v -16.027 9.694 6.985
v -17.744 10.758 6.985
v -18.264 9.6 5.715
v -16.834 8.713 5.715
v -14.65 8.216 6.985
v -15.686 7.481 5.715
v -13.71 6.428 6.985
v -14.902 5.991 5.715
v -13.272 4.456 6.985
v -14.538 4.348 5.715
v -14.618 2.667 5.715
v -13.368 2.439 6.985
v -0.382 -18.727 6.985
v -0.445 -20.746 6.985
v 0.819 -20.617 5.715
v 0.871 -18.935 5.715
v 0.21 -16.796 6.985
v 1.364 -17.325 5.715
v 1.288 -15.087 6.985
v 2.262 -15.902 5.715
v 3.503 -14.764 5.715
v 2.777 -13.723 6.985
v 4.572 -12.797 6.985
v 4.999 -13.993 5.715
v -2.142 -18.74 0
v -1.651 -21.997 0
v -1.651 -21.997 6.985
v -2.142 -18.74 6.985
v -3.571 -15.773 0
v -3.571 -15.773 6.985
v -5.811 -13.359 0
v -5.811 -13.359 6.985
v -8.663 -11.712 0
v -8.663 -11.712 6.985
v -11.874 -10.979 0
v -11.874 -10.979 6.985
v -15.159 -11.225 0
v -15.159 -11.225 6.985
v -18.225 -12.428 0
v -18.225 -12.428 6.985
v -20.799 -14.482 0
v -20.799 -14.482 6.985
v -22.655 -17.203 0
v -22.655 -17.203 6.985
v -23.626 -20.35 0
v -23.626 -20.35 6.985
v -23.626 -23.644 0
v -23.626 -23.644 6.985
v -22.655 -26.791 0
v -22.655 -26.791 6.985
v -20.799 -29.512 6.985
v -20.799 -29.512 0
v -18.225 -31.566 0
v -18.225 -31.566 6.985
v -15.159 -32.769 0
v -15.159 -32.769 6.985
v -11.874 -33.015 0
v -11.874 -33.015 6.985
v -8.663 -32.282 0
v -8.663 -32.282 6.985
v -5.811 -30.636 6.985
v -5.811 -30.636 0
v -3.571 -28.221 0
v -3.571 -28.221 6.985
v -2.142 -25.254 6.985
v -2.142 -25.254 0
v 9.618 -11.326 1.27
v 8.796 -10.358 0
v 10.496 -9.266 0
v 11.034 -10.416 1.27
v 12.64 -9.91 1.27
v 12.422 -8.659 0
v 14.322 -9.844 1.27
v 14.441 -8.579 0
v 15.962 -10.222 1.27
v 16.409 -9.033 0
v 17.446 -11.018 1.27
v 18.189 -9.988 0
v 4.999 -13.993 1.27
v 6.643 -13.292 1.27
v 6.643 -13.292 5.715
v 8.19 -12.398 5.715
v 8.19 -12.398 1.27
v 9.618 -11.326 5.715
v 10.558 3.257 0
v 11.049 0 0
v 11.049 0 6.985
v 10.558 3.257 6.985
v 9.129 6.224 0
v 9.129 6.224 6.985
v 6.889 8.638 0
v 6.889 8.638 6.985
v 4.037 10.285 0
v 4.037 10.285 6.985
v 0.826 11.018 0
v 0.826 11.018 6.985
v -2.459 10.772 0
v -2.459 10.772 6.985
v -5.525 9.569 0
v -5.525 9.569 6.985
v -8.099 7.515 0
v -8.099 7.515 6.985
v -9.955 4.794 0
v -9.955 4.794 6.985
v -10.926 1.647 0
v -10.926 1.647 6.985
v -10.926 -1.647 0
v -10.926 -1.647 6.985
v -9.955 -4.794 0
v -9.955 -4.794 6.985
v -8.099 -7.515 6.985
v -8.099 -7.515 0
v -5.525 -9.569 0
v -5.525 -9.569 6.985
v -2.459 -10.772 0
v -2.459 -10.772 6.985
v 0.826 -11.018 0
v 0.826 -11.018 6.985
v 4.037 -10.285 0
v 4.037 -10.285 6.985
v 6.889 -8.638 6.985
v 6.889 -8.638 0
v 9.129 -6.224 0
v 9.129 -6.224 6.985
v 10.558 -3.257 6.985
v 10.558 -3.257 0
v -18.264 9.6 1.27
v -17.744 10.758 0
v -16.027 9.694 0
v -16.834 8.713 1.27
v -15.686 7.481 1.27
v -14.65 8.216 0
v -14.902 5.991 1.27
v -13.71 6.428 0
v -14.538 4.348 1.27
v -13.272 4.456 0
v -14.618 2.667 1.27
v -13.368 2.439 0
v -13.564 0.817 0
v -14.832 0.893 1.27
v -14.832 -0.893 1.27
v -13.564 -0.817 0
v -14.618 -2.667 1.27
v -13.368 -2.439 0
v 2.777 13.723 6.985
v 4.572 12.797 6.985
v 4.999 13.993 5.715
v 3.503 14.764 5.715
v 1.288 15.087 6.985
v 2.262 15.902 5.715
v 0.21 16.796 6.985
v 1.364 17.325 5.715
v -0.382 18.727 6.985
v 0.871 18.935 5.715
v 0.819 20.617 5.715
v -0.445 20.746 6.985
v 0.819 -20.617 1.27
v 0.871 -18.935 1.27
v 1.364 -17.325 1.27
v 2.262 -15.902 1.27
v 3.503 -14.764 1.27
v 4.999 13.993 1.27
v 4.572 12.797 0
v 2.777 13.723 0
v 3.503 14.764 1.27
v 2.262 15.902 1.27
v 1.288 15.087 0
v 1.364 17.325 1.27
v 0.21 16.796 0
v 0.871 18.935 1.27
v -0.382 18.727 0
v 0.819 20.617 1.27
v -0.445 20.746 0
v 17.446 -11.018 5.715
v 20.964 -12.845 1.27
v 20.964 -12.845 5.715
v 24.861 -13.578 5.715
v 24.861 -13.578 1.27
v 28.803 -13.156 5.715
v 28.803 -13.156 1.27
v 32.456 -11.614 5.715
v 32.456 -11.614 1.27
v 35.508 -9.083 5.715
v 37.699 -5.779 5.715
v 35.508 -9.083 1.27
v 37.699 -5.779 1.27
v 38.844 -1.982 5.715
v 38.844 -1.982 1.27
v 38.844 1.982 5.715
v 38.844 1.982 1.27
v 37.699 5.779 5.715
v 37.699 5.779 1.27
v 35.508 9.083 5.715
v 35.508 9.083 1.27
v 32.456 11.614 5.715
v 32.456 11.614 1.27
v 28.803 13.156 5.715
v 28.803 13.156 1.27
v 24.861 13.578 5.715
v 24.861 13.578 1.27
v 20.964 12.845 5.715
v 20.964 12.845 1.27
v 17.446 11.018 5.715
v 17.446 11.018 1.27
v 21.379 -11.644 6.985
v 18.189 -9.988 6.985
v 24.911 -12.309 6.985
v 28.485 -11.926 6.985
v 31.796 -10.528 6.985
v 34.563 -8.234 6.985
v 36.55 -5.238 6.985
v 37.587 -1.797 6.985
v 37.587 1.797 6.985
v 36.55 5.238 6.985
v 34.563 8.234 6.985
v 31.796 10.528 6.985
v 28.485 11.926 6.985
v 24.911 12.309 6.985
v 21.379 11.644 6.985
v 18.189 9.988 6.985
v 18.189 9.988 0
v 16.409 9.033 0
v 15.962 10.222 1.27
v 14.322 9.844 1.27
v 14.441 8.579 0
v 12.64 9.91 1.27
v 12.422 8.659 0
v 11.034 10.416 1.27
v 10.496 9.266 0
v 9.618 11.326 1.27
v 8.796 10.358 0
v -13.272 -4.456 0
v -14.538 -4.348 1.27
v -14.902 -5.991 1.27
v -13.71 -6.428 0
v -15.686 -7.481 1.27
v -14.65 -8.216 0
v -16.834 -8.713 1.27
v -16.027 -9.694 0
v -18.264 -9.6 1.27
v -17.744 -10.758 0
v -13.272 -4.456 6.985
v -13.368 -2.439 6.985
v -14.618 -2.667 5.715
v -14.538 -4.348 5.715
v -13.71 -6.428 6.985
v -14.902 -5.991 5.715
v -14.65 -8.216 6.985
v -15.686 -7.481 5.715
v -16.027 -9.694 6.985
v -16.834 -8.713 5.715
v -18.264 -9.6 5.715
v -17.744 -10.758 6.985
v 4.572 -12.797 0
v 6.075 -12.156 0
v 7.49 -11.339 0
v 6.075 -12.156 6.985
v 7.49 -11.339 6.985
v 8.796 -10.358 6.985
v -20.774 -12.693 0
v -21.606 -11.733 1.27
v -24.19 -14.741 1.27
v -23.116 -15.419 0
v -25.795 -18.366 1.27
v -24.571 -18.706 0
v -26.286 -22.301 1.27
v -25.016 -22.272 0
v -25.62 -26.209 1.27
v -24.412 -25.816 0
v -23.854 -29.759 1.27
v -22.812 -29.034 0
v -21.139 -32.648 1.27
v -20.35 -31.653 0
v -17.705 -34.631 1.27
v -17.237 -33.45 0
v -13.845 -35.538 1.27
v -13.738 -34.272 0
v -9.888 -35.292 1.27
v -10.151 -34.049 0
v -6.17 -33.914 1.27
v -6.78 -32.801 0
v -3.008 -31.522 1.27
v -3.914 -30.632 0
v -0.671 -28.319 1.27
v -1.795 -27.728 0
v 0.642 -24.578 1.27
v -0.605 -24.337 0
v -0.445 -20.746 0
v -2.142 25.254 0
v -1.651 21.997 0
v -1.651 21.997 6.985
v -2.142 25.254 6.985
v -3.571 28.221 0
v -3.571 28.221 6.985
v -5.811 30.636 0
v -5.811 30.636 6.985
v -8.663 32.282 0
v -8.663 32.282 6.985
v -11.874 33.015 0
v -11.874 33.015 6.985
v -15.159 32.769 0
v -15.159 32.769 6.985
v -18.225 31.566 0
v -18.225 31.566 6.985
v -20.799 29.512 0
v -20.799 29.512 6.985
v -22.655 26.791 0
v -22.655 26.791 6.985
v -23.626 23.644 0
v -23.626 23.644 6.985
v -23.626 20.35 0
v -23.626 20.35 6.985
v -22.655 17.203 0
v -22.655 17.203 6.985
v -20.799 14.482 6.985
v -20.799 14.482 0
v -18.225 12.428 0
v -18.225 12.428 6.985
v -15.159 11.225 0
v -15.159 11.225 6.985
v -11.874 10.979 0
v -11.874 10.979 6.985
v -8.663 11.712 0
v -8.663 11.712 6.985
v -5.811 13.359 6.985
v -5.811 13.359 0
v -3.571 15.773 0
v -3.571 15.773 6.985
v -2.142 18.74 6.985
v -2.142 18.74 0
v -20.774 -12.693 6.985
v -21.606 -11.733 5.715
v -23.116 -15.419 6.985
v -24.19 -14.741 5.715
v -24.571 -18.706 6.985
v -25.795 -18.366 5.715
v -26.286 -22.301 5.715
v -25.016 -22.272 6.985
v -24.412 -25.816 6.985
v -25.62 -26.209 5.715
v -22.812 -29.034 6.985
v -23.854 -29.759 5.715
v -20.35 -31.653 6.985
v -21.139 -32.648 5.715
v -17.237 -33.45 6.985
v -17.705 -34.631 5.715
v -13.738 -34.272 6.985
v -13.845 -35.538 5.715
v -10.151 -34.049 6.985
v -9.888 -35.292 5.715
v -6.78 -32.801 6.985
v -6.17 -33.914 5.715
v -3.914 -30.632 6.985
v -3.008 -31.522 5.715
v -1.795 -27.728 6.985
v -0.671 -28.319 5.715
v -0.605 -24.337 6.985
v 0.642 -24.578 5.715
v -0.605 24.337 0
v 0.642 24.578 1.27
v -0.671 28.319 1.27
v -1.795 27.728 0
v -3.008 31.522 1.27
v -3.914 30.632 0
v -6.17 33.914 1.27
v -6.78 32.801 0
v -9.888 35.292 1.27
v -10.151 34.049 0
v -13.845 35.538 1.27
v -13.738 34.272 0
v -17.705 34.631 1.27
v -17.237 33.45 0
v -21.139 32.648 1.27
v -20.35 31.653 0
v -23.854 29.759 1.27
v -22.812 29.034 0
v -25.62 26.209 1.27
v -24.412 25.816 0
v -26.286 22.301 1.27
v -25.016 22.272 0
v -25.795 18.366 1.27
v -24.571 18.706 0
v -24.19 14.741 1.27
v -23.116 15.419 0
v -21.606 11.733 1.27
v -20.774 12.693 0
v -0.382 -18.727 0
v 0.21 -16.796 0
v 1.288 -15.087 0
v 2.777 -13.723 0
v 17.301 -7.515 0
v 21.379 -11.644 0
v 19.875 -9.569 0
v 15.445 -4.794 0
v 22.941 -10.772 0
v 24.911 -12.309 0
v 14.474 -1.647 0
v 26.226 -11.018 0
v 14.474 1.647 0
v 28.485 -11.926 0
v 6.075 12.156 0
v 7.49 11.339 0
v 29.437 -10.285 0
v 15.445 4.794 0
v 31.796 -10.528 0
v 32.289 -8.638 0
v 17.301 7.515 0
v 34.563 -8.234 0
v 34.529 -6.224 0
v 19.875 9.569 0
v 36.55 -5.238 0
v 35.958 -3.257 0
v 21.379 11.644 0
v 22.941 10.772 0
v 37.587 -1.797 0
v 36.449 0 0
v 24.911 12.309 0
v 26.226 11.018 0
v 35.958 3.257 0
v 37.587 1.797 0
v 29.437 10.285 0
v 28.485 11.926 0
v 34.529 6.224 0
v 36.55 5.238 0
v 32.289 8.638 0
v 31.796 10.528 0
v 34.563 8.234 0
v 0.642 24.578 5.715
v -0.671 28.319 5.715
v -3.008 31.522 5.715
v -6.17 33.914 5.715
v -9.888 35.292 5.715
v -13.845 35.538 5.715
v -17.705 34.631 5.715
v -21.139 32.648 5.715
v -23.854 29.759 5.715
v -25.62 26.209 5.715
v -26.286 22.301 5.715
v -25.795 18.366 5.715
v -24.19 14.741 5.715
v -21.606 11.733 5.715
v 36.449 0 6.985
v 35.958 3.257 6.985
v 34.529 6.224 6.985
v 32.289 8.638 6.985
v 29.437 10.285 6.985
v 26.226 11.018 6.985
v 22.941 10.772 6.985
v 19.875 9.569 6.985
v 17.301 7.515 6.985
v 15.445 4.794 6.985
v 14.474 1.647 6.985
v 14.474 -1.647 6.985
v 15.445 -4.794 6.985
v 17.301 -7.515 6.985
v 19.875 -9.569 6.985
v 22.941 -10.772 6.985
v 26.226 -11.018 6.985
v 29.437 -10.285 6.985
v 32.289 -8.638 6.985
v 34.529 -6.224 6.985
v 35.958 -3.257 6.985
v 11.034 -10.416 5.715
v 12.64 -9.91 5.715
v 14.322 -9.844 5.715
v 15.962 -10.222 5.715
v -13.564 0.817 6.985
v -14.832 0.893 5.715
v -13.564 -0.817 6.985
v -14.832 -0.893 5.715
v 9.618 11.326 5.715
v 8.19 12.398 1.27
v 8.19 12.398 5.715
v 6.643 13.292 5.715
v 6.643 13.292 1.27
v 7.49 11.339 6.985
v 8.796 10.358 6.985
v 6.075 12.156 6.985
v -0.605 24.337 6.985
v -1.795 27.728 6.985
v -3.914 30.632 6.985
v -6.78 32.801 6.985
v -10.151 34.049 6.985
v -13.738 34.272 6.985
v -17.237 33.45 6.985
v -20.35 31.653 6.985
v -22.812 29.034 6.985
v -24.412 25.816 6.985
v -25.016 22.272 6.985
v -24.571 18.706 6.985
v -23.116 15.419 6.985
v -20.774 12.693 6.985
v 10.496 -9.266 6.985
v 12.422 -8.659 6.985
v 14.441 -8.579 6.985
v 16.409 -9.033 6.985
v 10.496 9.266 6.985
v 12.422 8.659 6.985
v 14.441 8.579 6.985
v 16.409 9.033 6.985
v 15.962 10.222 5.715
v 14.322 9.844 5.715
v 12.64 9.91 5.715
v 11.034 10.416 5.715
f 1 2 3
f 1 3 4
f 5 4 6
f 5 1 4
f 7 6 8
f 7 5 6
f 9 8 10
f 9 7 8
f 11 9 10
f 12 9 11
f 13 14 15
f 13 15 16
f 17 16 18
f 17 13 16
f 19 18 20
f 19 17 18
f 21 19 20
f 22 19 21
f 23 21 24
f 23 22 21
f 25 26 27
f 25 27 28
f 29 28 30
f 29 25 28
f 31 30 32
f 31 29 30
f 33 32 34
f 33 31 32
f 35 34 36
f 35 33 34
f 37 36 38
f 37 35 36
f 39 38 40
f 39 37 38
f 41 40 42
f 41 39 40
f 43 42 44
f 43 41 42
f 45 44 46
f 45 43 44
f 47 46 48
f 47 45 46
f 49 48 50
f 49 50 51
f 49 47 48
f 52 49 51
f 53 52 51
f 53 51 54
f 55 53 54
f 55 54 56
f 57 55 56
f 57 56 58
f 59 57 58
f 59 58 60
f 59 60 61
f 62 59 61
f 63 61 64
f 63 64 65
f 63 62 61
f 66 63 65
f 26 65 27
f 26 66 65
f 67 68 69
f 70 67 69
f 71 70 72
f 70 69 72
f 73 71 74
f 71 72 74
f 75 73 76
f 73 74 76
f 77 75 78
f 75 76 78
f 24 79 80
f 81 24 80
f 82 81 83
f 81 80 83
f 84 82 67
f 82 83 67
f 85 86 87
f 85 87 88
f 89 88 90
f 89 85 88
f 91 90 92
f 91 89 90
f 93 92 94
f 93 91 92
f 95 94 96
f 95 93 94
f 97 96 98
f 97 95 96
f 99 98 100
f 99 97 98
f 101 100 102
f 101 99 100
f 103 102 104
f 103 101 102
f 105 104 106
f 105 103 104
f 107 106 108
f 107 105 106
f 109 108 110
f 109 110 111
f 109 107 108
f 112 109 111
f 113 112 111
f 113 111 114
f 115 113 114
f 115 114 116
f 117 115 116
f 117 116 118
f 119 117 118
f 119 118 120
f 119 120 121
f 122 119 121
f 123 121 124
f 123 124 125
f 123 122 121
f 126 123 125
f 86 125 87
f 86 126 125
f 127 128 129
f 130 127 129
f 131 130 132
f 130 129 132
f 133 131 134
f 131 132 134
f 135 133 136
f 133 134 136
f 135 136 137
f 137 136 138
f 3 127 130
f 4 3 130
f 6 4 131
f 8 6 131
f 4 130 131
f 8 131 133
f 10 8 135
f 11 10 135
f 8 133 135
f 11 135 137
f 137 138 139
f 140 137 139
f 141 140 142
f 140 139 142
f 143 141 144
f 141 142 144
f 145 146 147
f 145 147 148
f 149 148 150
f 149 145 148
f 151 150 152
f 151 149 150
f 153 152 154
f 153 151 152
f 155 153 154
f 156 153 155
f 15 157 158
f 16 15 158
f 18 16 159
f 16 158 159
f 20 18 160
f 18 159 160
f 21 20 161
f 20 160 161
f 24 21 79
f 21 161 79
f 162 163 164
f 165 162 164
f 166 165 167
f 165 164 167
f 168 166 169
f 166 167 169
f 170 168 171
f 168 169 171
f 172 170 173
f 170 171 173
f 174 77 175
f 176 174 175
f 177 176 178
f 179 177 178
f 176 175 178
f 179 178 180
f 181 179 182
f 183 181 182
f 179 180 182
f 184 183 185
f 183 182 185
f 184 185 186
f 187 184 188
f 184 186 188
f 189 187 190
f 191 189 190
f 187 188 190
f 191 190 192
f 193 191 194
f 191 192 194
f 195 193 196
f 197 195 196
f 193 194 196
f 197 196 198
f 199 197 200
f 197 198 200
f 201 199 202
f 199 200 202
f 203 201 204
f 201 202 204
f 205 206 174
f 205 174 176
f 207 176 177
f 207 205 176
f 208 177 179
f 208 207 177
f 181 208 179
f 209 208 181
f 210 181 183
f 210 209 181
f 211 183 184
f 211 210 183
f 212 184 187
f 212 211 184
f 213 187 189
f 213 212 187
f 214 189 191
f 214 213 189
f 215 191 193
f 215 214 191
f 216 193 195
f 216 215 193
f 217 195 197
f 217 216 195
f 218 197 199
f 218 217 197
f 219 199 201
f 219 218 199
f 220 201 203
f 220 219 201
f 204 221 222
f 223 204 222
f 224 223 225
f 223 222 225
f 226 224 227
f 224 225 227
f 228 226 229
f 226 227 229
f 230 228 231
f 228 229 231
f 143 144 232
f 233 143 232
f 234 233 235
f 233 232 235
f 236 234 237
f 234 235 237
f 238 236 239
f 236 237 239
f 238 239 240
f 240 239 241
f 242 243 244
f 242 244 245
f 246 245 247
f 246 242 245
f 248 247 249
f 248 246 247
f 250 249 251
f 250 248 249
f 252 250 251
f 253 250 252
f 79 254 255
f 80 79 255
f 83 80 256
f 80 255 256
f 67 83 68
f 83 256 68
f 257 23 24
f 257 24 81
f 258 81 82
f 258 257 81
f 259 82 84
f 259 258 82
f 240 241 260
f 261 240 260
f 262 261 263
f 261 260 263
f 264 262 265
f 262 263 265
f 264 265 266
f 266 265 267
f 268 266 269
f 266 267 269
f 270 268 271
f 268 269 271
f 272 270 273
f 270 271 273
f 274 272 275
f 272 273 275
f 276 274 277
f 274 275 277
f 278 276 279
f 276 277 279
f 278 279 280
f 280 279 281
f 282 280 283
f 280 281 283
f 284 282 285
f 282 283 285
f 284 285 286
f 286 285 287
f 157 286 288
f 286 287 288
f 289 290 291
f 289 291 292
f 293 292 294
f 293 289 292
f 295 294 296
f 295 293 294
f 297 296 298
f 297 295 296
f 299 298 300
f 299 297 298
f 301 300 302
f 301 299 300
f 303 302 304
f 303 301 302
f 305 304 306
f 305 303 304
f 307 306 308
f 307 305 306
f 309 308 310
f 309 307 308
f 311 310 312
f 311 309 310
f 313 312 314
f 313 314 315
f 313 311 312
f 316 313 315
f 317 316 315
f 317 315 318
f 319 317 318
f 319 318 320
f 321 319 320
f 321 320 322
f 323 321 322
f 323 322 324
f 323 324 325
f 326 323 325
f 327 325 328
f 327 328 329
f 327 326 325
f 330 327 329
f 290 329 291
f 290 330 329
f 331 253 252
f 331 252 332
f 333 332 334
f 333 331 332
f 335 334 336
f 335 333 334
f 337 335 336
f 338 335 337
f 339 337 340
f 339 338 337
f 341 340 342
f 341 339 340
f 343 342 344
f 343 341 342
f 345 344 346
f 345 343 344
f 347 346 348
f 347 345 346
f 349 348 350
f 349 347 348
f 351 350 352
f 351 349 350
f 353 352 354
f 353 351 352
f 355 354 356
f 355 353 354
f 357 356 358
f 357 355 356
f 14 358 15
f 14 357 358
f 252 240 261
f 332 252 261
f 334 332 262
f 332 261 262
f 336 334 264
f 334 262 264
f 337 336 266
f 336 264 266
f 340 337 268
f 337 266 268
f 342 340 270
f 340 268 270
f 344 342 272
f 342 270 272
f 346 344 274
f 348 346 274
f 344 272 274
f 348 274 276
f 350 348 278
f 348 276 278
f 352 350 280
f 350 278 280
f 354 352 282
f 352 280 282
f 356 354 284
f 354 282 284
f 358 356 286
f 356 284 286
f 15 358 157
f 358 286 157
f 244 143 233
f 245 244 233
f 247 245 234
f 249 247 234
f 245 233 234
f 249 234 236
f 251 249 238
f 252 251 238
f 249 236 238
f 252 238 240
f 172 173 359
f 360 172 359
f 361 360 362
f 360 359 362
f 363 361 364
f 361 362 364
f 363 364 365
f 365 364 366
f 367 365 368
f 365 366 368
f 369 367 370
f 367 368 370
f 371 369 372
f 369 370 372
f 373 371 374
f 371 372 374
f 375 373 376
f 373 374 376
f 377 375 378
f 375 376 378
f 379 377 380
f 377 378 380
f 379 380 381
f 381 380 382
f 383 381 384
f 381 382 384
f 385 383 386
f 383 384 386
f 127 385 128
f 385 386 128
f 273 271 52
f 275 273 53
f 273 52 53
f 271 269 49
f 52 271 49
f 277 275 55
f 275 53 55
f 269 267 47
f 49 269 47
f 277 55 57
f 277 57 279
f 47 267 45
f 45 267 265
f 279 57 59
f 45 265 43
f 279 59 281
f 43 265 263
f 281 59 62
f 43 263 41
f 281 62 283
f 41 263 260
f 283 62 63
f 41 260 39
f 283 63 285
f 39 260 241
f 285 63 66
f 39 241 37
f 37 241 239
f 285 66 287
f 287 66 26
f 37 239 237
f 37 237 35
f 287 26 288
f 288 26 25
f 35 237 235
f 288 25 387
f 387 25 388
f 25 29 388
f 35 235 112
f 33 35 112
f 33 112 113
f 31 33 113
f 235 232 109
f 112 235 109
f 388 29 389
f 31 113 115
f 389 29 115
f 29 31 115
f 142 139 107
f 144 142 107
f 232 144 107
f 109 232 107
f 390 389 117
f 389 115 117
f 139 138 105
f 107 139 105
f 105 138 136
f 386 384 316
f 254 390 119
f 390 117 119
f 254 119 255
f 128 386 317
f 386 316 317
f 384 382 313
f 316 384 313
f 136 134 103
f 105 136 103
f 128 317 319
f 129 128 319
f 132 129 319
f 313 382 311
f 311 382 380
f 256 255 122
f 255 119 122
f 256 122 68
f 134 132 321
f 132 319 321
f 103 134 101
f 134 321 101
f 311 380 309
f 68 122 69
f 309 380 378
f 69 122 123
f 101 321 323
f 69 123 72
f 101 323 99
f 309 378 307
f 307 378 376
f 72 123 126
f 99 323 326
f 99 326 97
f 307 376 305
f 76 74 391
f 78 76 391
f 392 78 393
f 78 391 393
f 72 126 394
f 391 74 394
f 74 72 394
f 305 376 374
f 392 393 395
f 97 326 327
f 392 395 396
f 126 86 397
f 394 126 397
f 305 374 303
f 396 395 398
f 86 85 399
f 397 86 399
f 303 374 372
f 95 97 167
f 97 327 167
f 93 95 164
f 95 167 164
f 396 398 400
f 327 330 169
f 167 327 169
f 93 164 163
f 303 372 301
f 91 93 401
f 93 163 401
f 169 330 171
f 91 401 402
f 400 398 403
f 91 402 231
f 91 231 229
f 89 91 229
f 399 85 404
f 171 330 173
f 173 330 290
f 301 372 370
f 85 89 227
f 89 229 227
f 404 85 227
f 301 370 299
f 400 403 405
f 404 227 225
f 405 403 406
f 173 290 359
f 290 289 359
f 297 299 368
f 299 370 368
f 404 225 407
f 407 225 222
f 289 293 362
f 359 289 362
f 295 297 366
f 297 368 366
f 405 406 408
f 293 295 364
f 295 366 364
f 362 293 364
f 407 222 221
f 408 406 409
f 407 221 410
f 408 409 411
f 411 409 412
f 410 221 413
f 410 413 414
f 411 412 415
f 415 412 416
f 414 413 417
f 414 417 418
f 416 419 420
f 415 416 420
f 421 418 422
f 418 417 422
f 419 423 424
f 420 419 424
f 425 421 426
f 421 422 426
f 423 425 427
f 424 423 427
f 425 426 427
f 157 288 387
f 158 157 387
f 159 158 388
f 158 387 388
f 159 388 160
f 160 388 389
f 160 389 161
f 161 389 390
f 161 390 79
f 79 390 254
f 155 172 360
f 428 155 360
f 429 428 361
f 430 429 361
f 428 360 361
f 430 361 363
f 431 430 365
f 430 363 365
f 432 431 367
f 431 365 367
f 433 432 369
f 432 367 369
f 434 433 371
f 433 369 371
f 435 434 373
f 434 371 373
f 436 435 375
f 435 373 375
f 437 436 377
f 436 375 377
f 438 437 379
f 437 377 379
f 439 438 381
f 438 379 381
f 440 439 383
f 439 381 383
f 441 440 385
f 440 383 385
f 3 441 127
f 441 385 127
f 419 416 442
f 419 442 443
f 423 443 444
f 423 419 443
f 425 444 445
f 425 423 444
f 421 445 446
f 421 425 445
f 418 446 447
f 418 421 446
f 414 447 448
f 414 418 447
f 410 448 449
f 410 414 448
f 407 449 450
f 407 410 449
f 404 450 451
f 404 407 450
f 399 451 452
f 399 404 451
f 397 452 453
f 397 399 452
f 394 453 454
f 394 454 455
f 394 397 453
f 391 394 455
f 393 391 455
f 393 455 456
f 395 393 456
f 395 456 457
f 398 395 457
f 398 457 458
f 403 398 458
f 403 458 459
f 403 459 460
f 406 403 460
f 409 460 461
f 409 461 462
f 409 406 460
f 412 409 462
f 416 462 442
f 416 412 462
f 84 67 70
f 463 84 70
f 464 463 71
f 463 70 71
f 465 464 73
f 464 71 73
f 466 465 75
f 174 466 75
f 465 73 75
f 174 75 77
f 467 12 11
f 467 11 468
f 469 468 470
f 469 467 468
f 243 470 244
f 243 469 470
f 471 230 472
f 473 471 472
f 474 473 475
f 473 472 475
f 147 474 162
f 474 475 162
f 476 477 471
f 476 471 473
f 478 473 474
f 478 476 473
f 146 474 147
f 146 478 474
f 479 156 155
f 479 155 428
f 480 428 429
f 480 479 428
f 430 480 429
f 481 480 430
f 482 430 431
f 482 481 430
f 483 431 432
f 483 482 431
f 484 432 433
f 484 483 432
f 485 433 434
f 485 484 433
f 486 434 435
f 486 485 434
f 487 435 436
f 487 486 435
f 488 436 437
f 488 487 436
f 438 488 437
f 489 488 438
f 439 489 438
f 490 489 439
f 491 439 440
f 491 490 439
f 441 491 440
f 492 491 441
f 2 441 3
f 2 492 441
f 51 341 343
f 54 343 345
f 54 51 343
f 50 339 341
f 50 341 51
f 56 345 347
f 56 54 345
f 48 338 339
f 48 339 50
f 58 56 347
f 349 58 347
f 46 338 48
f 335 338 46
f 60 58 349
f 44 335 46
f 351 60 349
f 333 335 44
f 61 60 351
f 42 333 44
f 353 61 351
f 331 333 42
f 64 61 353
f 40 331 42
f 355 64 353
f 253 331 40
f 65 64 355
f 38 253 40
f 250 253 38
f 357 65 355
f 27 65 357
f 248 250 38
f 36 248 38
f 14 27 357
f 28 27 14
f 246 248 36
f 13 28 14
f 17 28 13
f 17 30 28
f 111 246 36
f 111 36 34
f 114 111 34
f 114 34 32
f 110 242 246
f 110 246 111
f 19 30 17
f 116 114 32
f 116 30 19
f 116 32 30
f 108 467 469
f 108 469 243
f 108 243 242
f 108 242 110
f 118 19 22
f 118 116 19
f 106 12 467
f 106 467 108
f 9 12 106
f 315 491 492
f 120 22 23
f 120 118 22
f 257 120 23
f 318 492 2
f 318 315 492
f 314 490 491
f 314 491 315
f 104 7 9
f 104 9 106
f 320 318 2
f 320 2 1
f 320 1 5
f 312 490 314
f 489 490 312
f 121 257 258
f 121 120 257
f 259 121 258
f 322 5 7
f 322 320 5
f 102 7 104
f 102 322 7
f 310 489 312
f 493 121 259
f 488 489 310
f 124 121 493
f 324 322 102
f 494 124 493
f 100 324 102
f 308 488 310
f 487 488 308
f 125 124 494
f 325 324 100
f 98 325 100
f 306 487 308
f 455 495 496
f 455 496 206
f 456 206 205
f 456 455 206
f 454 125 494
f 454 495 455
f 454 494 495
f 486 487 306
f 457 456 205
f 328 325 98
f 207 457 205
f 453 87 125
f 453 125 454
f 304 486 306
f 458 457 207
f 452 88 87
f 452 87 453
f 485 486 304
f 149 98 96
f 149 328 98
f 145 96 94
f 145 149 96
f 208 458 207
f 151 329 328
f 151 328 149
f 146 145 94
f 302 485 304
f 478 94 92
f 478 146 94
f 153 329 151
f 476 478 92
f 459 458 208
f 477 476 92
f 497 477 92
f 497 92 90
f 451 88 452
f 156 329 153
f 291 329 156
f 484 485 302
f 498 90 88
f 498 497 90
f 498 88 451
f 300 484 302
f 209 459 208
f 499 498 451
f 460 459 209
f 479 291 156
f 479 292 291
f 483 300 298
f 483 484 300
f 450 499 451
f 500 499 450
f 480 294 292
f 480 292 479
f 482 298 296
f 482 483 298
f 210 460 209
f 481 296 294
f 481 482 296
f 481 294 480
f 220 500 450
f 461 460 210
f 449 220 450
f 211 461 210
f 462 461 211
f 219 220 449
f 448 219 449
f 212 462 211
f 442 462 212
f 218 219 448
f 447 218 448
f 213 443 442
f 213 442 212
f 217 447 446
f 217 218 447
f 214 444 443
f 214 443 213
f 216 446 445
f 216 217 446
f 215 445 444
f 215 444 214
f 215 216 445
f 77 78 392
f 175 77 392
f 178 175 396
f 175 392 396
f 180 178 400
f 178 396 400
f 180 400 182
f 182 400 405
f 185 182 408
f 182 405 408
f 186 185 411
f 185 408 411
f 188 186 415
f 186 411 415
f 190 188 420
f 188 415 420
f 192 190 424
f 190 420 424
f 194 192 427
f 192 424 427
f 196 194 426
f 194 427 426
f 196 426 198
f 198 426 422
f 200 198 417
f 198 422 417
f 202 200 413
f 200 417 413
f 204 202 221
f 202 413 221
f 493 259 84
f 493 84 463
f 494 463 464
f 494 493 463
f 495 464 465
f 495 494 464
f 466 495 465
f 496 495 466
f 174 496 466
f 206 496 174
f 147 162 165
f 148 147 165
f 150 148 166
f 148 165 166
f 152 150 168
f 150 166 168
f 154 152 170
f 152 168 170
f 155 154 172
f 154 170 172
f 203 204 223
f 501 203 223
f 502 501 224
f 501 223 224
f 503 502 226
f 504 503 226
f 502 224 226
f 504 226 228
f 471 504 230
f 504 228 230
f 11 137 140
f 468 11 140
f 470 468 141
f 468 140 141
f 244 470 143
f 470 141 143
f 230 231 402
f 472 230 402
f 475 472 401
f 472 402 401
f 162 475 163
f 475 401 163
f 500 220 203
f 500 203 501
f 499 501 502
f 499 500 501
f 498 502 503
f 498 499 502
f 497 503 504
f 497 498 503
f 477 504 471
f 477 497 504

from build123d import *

# Parameters (mm, degrees)
F0_R     = 11.049
F1_DEPTH = 6.985
F2_SIZE  = 1.27


with BuildPart() as f1:
    # F0 (on Top) → F1 (new body)
    with BuildSketch(Plane.XY):
        with BuildLine():
            ThreePointArc((4.999437, 13.992695), (1.765902, 16.583511), (0.818767, 20.617245))
            ThreePointArc((0.818767, 20.617245), (-19.4945, 33.765464), (-18.264442, 9.599549))
            ThreePointArc((-18.264442, 9.599549), (-15.244693, 6.762439), (-14.617748, 2.666708))
            ThreePointArc((-14.617748, 2.666708), (-14.859, 0), (-14.617748, -2.666708))
            ThreePointArc((-14.617748, -2.666708), (-15.244693, -6.762439), (-18.264442, -9.599549))
            ThreePointArc((-18.264442, -9.599549), (-19.4945, -33.765464), (0.818767, -20.617245))
            ThreePointArc((0.818767, -20.617245), (1.765902, -16.583511), (4.999437, -13.992695))
            ThreePointArc((4.999437, -13.992695), (7.4295, -12.868271), (9.618311, -11.325987))
            ThreePointArc((9.618311, -11.325987), (13.478791, -9.821072), (17.445675, -11.017696))
            ThreePointArc((17.445675, -11.017696), (38.989, 0), (17.445675, 11.017696))
            ThreePointArc((17.445675, 11.017696), (13.478791, 9.821072), (9.618311, 11.325987))
            ThreePointArc((9.618311, 11.325987), (7.4295, 12.868271), (4.999437, 13.992695))
        make_face()
        with Locations((-12.7, -21.997045)):
            Circle(F0_R, mode=Mode.SUBTRACT)
        Circle(F0_R, mode=Mode.SUBTRACT)
        with Locations((25.4, 0)):
            Circle(F0_R, mode=Mode.SUBTRACT)
        with Locations((-12.7, 21.997045)):
            Circle(F0_R, mode=Mode.SUBTRACT)
    extrude(amount=F1_DEPTH)

    # F2
    f2_edges = [f1.edges().sort_by_distance(p)[0] for p in [
        (-19.4945, -33.765464, 6.985),
        (1.765902, -16.583511, 0),
    ]]
    chamfer(f2_edges, length=F2_SIZE)


solid = f1.part
